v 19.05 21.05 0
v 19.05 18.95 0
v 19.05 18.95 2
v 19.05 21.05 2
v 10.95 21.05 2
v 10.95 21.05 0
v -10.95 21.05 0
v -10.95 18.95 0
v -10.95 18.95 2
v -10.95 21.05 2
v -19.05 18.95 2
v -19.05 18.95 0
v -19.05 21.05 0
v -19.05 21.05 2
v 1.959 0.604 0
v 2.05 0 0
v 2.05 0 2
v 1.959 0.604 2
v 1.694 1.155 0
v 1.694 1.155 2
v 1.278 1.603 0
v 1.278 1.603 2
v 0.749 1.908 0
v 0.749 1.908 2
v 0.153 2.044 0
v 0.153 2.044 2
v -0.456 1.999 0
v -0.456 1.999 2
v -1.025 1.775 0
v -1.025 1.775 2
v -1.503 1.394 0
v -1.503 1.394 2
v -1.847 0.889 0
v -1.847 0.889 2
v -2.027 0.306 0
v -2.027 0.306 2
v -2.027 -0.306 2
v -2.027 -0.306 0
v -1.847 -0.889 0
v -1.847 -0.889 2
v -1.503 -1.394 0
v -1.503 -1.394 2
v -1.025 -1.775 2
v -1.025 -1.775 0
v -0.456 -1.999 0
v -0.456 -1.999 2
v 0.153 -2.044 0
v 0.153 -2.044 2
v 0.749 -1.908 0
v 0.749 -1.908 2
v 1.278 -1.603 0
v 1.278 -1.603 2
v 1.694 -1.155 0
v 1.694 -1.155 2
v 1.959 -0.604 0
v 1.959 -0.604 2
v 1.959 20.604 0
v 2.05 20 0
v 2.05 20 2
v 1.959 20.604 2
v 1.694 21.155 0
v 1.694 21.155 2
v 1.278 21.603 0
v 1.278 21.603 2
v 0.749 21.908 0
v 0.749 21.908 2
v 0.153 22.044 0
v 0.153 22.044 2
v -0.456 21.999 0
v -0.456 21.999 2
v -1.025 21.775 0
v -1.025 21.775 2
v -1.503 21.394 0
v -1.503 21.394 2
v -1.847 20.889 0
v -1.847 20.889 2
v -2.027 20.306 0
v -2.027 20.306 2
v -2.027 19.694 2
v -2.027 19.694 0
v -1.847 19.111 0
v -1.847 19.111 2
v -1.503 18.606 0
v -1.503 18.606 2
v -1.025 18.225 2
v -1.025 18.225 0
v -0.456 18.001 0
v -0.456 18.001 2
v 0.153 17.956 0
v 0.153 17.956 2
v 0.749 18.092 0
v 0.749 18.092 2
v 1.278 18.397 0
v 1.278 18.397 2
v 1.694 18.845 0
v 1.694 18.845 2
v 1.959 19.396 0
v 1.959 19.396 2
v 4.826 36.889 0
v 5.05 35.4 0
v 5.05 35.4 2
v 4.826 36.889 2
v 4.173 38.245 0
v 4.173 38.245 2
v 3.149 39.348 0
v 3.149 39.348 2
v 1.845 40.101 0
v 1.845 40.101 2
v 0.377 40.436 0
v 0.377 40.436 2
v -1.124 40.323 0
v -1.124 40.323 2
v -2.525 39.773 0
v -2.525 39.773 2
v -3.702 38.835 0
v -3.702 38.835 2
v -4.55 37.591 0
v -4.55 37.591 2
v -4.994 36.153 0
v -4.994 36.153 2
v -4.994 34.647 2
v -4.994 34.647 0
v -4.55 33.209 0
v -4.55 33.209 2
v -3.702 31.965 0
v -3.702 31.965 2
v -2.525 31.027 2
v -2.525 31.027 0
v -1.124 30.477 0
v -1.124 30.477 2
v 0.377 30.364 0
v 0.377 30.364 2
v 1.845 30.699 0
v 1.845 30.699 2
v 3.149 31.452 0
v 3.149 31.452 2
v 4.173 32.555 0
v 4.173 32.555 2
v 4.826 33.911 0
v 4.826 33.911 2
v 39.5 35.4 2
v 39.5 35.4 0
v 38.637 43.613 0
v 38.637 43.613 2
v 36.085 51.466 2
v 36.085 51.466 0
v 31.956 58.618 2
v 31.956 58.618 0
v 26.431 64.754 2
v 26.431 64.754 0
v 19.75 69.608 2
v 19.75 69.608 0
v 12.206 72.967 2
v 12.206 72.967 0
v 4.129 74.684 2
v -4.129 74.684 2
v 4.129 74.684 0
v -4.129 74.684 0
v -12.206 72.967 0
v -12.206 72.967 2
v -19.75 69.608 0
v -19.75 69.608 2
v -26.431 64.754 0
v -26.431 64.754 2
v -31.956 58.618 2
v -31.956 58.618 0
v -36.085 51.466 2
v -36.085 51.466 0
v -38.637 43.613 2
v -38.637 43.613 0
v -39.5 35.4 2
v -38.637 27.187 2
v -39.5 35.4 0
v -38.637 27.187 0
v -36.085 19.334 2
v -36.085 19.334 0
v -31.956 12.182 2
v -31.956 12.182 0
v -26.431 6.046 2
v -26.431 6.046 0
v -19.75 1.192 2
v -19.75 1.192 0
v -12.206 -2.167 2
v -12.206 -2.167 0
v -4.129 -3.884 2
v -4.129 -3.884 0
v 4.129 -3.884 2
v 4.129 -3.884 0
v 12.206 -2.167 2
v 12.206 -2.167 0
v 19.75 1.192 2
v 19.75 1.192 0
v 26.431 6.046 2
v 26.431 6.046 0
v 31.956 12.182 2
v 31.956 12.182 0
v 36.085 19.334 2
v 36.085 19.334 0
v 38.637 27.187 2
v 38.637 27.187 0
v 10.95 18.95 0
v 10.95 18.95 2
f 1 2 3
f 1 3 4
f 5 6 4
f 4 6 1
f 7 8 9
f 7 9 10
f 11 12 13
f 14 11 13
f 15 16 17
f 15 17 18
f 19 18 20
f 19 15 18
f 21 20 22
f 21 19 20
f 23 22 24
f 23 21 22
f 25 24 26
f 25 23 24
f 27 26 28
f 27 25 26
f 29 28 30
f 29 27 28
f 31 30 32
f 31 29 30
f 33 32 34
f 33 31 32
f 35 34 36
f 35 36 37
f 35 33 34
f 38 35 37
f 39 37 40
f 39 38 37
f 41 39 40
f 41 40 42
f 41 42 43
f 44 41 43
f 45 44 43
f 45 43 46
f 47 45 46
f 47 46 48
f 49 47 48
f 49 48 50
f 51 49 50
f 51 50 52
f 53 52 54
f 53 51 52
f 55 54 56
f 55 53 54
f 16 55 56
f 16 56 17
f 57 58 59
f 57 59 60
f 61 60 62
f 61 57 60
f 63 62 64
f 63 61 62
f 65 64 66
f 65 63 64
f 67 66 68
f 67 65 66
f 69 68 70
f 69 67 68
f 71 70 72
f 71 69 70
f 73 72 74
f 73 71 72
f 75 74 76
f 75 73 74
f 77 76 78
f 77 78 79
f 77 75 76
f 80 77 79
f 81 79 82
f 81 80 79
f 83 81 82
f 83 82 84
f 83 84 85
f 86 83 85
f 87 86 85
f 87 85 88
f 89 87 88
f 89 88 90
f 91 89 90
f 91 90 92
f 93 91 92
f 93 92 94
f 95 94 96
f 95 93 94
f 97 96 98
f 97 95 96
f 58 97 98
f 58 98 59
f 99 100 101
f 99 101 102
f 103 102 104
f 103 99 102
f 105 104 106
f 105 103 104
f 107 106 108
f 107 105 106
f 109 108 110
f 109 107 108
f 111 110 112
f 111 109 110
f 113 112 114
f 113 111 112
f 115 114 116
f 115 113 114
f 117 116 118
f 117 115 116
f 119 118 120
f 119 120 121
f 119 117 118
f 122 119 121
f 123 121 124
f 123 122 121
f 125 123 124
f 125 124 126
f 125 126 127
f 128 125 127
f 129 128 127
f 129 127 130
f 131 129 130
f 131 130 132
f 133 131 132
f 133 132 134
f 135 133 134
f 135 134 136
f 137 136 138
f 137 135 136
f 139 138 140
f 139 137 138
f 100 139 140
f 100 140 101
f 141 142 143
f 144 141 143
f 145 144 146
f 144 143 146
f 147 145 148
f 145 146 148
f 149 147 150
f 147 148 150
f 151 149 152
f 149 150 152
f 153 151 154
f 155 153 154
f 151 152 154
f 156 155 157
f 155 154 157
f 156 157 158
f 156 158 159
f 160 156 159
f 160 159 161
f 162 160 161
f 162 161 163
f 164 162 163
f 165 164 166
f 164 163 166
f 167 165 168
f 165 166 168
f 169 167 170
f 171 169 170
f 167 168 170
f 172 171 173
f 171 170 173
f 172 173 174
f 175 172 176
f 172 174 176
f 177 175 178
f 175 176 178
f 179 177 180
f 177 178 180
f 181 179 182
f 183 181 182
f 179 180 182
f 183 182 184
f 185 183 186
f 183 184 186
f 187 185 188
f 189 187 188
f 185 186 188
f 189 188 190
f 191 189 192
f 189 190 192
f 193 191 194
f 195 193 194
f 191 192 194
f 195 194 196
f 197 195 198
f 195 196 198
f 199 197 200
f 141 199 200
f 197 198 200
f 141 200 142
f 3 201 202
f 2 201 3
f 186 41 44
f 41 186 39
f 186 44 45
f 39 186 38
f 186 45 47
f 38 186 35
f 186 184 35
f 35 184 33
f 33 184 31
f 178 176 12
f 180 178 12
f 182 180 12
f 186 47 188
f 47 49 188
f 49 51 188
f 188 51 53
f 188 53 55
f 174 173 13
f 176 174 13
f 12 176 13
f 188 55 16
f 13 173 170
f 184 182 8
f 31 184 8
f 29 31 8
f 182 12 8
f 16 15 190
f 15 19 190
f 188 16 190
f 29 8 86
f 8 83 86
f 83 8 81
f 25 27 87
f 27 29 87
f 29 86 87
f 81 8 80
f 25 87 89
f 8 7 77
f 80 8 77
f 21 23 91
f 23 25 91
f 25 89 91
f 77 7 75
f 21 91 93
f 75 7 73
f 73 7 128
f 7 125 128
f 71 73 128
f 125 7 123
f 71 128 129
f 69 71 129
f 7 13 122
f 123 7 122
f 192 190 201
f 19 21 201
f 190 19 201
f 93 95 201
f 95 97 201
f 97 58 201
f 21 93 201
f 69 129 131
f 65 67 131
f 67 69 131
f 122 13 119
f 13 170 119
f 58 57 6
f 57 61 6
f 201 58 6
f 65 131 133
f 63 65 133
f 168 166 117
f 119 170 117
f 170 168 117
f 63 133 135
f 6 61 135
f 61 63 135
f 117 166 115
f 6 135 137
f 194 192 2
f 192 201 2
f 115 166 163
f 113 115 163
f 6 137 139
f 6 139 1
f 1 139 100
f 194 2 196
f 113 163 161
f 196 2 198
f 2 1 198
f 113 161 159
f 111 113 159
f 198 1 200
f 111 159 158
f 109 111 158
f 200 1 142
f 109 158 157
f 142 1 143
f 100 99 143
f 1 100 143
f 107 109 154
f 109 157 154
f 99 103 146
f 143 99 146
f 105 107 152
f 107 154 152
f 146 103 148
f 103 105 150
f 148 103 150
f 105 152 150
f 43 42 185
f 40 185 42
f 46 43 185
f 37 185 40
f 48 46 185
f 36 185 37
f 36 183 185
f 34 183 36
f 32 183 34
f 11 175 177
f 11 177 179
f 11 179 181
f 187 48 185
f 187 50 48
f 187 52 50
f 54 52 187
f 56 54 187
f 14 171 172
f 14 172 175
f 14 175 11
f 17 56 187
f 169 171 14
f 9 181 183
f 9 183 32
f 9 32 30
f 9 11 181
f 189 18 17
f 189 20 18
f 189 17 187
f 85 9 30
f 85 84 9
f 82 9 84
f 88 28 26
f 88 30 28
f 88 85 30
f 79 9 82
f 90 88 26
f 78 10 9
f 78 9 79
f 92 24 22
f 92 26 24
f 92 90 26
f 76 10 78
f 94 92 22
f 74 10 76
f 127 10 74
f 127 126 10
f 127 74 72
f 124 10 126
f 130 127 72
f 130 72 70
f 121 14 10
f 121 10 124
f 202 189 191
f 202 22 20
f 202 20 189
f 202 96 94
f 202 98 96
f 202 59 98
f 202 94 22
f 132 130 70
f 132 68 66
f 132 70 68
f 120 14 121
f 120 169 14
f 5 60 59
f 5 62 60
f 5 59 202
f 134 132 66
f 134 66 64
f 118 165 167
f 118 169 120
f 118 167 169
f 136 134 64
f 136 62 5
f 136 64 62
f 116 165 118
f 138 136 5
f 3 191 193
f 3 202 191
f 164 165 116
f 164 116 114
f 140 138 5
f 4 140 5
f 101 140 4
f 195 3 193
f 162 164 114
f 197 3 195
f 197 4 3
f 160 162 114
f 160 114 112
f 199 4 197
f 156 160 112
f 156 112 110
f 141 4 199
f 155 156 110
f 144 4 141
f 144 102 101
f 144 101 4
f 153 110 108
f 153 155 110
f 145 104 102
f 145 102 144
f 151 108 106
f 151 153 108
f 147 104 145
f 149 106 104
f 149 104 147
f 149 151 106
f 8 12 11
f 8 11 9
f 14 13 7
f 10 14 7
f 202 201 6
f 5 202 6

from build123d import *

# Parameters (mm, degrees)
SKETCH_1_R      = 39.5
SKETCH_1_R_2    = 2.05
SKETCH_1_R_3    = 5.05
SKETCH_1_W      = 8.1
SKETCH_1_H      = 2.1
EXTRUDE_1_DEPTH = 2


with BuildPart() as part:
    # 草图1 → 凸台-拉伸1 (new body)
    with BuildSketch(Plane.XY):
        with Locations((0, 35.4)):
            Circle(SKETCH_1_R)
        Circle(SKETCH_1_R_2, mode=Mode.SUBTRACT)
        with Locations((0, 20)):
            Circle(SKETCH_1_R_2, mode=Mode.SUBTRACT)
        with Locations((0, 35.4)):
            Circle(SKETCH_1_R_3, mode=Mode.SUBTRACT)
        with Locations((-15, 20)):
            Rectangle(SKETCH_1_W, SKETCH_1_H, mode=Mode.SUBTRACT)
        with Locations((15, 20)):
            Rectangle(SKETCH_1_W, SKETCH_1_H, mode=Mode.SUBTRACT)
    extrude(amount=EXTRUDE_1_DEPTH)


solid = part.part
